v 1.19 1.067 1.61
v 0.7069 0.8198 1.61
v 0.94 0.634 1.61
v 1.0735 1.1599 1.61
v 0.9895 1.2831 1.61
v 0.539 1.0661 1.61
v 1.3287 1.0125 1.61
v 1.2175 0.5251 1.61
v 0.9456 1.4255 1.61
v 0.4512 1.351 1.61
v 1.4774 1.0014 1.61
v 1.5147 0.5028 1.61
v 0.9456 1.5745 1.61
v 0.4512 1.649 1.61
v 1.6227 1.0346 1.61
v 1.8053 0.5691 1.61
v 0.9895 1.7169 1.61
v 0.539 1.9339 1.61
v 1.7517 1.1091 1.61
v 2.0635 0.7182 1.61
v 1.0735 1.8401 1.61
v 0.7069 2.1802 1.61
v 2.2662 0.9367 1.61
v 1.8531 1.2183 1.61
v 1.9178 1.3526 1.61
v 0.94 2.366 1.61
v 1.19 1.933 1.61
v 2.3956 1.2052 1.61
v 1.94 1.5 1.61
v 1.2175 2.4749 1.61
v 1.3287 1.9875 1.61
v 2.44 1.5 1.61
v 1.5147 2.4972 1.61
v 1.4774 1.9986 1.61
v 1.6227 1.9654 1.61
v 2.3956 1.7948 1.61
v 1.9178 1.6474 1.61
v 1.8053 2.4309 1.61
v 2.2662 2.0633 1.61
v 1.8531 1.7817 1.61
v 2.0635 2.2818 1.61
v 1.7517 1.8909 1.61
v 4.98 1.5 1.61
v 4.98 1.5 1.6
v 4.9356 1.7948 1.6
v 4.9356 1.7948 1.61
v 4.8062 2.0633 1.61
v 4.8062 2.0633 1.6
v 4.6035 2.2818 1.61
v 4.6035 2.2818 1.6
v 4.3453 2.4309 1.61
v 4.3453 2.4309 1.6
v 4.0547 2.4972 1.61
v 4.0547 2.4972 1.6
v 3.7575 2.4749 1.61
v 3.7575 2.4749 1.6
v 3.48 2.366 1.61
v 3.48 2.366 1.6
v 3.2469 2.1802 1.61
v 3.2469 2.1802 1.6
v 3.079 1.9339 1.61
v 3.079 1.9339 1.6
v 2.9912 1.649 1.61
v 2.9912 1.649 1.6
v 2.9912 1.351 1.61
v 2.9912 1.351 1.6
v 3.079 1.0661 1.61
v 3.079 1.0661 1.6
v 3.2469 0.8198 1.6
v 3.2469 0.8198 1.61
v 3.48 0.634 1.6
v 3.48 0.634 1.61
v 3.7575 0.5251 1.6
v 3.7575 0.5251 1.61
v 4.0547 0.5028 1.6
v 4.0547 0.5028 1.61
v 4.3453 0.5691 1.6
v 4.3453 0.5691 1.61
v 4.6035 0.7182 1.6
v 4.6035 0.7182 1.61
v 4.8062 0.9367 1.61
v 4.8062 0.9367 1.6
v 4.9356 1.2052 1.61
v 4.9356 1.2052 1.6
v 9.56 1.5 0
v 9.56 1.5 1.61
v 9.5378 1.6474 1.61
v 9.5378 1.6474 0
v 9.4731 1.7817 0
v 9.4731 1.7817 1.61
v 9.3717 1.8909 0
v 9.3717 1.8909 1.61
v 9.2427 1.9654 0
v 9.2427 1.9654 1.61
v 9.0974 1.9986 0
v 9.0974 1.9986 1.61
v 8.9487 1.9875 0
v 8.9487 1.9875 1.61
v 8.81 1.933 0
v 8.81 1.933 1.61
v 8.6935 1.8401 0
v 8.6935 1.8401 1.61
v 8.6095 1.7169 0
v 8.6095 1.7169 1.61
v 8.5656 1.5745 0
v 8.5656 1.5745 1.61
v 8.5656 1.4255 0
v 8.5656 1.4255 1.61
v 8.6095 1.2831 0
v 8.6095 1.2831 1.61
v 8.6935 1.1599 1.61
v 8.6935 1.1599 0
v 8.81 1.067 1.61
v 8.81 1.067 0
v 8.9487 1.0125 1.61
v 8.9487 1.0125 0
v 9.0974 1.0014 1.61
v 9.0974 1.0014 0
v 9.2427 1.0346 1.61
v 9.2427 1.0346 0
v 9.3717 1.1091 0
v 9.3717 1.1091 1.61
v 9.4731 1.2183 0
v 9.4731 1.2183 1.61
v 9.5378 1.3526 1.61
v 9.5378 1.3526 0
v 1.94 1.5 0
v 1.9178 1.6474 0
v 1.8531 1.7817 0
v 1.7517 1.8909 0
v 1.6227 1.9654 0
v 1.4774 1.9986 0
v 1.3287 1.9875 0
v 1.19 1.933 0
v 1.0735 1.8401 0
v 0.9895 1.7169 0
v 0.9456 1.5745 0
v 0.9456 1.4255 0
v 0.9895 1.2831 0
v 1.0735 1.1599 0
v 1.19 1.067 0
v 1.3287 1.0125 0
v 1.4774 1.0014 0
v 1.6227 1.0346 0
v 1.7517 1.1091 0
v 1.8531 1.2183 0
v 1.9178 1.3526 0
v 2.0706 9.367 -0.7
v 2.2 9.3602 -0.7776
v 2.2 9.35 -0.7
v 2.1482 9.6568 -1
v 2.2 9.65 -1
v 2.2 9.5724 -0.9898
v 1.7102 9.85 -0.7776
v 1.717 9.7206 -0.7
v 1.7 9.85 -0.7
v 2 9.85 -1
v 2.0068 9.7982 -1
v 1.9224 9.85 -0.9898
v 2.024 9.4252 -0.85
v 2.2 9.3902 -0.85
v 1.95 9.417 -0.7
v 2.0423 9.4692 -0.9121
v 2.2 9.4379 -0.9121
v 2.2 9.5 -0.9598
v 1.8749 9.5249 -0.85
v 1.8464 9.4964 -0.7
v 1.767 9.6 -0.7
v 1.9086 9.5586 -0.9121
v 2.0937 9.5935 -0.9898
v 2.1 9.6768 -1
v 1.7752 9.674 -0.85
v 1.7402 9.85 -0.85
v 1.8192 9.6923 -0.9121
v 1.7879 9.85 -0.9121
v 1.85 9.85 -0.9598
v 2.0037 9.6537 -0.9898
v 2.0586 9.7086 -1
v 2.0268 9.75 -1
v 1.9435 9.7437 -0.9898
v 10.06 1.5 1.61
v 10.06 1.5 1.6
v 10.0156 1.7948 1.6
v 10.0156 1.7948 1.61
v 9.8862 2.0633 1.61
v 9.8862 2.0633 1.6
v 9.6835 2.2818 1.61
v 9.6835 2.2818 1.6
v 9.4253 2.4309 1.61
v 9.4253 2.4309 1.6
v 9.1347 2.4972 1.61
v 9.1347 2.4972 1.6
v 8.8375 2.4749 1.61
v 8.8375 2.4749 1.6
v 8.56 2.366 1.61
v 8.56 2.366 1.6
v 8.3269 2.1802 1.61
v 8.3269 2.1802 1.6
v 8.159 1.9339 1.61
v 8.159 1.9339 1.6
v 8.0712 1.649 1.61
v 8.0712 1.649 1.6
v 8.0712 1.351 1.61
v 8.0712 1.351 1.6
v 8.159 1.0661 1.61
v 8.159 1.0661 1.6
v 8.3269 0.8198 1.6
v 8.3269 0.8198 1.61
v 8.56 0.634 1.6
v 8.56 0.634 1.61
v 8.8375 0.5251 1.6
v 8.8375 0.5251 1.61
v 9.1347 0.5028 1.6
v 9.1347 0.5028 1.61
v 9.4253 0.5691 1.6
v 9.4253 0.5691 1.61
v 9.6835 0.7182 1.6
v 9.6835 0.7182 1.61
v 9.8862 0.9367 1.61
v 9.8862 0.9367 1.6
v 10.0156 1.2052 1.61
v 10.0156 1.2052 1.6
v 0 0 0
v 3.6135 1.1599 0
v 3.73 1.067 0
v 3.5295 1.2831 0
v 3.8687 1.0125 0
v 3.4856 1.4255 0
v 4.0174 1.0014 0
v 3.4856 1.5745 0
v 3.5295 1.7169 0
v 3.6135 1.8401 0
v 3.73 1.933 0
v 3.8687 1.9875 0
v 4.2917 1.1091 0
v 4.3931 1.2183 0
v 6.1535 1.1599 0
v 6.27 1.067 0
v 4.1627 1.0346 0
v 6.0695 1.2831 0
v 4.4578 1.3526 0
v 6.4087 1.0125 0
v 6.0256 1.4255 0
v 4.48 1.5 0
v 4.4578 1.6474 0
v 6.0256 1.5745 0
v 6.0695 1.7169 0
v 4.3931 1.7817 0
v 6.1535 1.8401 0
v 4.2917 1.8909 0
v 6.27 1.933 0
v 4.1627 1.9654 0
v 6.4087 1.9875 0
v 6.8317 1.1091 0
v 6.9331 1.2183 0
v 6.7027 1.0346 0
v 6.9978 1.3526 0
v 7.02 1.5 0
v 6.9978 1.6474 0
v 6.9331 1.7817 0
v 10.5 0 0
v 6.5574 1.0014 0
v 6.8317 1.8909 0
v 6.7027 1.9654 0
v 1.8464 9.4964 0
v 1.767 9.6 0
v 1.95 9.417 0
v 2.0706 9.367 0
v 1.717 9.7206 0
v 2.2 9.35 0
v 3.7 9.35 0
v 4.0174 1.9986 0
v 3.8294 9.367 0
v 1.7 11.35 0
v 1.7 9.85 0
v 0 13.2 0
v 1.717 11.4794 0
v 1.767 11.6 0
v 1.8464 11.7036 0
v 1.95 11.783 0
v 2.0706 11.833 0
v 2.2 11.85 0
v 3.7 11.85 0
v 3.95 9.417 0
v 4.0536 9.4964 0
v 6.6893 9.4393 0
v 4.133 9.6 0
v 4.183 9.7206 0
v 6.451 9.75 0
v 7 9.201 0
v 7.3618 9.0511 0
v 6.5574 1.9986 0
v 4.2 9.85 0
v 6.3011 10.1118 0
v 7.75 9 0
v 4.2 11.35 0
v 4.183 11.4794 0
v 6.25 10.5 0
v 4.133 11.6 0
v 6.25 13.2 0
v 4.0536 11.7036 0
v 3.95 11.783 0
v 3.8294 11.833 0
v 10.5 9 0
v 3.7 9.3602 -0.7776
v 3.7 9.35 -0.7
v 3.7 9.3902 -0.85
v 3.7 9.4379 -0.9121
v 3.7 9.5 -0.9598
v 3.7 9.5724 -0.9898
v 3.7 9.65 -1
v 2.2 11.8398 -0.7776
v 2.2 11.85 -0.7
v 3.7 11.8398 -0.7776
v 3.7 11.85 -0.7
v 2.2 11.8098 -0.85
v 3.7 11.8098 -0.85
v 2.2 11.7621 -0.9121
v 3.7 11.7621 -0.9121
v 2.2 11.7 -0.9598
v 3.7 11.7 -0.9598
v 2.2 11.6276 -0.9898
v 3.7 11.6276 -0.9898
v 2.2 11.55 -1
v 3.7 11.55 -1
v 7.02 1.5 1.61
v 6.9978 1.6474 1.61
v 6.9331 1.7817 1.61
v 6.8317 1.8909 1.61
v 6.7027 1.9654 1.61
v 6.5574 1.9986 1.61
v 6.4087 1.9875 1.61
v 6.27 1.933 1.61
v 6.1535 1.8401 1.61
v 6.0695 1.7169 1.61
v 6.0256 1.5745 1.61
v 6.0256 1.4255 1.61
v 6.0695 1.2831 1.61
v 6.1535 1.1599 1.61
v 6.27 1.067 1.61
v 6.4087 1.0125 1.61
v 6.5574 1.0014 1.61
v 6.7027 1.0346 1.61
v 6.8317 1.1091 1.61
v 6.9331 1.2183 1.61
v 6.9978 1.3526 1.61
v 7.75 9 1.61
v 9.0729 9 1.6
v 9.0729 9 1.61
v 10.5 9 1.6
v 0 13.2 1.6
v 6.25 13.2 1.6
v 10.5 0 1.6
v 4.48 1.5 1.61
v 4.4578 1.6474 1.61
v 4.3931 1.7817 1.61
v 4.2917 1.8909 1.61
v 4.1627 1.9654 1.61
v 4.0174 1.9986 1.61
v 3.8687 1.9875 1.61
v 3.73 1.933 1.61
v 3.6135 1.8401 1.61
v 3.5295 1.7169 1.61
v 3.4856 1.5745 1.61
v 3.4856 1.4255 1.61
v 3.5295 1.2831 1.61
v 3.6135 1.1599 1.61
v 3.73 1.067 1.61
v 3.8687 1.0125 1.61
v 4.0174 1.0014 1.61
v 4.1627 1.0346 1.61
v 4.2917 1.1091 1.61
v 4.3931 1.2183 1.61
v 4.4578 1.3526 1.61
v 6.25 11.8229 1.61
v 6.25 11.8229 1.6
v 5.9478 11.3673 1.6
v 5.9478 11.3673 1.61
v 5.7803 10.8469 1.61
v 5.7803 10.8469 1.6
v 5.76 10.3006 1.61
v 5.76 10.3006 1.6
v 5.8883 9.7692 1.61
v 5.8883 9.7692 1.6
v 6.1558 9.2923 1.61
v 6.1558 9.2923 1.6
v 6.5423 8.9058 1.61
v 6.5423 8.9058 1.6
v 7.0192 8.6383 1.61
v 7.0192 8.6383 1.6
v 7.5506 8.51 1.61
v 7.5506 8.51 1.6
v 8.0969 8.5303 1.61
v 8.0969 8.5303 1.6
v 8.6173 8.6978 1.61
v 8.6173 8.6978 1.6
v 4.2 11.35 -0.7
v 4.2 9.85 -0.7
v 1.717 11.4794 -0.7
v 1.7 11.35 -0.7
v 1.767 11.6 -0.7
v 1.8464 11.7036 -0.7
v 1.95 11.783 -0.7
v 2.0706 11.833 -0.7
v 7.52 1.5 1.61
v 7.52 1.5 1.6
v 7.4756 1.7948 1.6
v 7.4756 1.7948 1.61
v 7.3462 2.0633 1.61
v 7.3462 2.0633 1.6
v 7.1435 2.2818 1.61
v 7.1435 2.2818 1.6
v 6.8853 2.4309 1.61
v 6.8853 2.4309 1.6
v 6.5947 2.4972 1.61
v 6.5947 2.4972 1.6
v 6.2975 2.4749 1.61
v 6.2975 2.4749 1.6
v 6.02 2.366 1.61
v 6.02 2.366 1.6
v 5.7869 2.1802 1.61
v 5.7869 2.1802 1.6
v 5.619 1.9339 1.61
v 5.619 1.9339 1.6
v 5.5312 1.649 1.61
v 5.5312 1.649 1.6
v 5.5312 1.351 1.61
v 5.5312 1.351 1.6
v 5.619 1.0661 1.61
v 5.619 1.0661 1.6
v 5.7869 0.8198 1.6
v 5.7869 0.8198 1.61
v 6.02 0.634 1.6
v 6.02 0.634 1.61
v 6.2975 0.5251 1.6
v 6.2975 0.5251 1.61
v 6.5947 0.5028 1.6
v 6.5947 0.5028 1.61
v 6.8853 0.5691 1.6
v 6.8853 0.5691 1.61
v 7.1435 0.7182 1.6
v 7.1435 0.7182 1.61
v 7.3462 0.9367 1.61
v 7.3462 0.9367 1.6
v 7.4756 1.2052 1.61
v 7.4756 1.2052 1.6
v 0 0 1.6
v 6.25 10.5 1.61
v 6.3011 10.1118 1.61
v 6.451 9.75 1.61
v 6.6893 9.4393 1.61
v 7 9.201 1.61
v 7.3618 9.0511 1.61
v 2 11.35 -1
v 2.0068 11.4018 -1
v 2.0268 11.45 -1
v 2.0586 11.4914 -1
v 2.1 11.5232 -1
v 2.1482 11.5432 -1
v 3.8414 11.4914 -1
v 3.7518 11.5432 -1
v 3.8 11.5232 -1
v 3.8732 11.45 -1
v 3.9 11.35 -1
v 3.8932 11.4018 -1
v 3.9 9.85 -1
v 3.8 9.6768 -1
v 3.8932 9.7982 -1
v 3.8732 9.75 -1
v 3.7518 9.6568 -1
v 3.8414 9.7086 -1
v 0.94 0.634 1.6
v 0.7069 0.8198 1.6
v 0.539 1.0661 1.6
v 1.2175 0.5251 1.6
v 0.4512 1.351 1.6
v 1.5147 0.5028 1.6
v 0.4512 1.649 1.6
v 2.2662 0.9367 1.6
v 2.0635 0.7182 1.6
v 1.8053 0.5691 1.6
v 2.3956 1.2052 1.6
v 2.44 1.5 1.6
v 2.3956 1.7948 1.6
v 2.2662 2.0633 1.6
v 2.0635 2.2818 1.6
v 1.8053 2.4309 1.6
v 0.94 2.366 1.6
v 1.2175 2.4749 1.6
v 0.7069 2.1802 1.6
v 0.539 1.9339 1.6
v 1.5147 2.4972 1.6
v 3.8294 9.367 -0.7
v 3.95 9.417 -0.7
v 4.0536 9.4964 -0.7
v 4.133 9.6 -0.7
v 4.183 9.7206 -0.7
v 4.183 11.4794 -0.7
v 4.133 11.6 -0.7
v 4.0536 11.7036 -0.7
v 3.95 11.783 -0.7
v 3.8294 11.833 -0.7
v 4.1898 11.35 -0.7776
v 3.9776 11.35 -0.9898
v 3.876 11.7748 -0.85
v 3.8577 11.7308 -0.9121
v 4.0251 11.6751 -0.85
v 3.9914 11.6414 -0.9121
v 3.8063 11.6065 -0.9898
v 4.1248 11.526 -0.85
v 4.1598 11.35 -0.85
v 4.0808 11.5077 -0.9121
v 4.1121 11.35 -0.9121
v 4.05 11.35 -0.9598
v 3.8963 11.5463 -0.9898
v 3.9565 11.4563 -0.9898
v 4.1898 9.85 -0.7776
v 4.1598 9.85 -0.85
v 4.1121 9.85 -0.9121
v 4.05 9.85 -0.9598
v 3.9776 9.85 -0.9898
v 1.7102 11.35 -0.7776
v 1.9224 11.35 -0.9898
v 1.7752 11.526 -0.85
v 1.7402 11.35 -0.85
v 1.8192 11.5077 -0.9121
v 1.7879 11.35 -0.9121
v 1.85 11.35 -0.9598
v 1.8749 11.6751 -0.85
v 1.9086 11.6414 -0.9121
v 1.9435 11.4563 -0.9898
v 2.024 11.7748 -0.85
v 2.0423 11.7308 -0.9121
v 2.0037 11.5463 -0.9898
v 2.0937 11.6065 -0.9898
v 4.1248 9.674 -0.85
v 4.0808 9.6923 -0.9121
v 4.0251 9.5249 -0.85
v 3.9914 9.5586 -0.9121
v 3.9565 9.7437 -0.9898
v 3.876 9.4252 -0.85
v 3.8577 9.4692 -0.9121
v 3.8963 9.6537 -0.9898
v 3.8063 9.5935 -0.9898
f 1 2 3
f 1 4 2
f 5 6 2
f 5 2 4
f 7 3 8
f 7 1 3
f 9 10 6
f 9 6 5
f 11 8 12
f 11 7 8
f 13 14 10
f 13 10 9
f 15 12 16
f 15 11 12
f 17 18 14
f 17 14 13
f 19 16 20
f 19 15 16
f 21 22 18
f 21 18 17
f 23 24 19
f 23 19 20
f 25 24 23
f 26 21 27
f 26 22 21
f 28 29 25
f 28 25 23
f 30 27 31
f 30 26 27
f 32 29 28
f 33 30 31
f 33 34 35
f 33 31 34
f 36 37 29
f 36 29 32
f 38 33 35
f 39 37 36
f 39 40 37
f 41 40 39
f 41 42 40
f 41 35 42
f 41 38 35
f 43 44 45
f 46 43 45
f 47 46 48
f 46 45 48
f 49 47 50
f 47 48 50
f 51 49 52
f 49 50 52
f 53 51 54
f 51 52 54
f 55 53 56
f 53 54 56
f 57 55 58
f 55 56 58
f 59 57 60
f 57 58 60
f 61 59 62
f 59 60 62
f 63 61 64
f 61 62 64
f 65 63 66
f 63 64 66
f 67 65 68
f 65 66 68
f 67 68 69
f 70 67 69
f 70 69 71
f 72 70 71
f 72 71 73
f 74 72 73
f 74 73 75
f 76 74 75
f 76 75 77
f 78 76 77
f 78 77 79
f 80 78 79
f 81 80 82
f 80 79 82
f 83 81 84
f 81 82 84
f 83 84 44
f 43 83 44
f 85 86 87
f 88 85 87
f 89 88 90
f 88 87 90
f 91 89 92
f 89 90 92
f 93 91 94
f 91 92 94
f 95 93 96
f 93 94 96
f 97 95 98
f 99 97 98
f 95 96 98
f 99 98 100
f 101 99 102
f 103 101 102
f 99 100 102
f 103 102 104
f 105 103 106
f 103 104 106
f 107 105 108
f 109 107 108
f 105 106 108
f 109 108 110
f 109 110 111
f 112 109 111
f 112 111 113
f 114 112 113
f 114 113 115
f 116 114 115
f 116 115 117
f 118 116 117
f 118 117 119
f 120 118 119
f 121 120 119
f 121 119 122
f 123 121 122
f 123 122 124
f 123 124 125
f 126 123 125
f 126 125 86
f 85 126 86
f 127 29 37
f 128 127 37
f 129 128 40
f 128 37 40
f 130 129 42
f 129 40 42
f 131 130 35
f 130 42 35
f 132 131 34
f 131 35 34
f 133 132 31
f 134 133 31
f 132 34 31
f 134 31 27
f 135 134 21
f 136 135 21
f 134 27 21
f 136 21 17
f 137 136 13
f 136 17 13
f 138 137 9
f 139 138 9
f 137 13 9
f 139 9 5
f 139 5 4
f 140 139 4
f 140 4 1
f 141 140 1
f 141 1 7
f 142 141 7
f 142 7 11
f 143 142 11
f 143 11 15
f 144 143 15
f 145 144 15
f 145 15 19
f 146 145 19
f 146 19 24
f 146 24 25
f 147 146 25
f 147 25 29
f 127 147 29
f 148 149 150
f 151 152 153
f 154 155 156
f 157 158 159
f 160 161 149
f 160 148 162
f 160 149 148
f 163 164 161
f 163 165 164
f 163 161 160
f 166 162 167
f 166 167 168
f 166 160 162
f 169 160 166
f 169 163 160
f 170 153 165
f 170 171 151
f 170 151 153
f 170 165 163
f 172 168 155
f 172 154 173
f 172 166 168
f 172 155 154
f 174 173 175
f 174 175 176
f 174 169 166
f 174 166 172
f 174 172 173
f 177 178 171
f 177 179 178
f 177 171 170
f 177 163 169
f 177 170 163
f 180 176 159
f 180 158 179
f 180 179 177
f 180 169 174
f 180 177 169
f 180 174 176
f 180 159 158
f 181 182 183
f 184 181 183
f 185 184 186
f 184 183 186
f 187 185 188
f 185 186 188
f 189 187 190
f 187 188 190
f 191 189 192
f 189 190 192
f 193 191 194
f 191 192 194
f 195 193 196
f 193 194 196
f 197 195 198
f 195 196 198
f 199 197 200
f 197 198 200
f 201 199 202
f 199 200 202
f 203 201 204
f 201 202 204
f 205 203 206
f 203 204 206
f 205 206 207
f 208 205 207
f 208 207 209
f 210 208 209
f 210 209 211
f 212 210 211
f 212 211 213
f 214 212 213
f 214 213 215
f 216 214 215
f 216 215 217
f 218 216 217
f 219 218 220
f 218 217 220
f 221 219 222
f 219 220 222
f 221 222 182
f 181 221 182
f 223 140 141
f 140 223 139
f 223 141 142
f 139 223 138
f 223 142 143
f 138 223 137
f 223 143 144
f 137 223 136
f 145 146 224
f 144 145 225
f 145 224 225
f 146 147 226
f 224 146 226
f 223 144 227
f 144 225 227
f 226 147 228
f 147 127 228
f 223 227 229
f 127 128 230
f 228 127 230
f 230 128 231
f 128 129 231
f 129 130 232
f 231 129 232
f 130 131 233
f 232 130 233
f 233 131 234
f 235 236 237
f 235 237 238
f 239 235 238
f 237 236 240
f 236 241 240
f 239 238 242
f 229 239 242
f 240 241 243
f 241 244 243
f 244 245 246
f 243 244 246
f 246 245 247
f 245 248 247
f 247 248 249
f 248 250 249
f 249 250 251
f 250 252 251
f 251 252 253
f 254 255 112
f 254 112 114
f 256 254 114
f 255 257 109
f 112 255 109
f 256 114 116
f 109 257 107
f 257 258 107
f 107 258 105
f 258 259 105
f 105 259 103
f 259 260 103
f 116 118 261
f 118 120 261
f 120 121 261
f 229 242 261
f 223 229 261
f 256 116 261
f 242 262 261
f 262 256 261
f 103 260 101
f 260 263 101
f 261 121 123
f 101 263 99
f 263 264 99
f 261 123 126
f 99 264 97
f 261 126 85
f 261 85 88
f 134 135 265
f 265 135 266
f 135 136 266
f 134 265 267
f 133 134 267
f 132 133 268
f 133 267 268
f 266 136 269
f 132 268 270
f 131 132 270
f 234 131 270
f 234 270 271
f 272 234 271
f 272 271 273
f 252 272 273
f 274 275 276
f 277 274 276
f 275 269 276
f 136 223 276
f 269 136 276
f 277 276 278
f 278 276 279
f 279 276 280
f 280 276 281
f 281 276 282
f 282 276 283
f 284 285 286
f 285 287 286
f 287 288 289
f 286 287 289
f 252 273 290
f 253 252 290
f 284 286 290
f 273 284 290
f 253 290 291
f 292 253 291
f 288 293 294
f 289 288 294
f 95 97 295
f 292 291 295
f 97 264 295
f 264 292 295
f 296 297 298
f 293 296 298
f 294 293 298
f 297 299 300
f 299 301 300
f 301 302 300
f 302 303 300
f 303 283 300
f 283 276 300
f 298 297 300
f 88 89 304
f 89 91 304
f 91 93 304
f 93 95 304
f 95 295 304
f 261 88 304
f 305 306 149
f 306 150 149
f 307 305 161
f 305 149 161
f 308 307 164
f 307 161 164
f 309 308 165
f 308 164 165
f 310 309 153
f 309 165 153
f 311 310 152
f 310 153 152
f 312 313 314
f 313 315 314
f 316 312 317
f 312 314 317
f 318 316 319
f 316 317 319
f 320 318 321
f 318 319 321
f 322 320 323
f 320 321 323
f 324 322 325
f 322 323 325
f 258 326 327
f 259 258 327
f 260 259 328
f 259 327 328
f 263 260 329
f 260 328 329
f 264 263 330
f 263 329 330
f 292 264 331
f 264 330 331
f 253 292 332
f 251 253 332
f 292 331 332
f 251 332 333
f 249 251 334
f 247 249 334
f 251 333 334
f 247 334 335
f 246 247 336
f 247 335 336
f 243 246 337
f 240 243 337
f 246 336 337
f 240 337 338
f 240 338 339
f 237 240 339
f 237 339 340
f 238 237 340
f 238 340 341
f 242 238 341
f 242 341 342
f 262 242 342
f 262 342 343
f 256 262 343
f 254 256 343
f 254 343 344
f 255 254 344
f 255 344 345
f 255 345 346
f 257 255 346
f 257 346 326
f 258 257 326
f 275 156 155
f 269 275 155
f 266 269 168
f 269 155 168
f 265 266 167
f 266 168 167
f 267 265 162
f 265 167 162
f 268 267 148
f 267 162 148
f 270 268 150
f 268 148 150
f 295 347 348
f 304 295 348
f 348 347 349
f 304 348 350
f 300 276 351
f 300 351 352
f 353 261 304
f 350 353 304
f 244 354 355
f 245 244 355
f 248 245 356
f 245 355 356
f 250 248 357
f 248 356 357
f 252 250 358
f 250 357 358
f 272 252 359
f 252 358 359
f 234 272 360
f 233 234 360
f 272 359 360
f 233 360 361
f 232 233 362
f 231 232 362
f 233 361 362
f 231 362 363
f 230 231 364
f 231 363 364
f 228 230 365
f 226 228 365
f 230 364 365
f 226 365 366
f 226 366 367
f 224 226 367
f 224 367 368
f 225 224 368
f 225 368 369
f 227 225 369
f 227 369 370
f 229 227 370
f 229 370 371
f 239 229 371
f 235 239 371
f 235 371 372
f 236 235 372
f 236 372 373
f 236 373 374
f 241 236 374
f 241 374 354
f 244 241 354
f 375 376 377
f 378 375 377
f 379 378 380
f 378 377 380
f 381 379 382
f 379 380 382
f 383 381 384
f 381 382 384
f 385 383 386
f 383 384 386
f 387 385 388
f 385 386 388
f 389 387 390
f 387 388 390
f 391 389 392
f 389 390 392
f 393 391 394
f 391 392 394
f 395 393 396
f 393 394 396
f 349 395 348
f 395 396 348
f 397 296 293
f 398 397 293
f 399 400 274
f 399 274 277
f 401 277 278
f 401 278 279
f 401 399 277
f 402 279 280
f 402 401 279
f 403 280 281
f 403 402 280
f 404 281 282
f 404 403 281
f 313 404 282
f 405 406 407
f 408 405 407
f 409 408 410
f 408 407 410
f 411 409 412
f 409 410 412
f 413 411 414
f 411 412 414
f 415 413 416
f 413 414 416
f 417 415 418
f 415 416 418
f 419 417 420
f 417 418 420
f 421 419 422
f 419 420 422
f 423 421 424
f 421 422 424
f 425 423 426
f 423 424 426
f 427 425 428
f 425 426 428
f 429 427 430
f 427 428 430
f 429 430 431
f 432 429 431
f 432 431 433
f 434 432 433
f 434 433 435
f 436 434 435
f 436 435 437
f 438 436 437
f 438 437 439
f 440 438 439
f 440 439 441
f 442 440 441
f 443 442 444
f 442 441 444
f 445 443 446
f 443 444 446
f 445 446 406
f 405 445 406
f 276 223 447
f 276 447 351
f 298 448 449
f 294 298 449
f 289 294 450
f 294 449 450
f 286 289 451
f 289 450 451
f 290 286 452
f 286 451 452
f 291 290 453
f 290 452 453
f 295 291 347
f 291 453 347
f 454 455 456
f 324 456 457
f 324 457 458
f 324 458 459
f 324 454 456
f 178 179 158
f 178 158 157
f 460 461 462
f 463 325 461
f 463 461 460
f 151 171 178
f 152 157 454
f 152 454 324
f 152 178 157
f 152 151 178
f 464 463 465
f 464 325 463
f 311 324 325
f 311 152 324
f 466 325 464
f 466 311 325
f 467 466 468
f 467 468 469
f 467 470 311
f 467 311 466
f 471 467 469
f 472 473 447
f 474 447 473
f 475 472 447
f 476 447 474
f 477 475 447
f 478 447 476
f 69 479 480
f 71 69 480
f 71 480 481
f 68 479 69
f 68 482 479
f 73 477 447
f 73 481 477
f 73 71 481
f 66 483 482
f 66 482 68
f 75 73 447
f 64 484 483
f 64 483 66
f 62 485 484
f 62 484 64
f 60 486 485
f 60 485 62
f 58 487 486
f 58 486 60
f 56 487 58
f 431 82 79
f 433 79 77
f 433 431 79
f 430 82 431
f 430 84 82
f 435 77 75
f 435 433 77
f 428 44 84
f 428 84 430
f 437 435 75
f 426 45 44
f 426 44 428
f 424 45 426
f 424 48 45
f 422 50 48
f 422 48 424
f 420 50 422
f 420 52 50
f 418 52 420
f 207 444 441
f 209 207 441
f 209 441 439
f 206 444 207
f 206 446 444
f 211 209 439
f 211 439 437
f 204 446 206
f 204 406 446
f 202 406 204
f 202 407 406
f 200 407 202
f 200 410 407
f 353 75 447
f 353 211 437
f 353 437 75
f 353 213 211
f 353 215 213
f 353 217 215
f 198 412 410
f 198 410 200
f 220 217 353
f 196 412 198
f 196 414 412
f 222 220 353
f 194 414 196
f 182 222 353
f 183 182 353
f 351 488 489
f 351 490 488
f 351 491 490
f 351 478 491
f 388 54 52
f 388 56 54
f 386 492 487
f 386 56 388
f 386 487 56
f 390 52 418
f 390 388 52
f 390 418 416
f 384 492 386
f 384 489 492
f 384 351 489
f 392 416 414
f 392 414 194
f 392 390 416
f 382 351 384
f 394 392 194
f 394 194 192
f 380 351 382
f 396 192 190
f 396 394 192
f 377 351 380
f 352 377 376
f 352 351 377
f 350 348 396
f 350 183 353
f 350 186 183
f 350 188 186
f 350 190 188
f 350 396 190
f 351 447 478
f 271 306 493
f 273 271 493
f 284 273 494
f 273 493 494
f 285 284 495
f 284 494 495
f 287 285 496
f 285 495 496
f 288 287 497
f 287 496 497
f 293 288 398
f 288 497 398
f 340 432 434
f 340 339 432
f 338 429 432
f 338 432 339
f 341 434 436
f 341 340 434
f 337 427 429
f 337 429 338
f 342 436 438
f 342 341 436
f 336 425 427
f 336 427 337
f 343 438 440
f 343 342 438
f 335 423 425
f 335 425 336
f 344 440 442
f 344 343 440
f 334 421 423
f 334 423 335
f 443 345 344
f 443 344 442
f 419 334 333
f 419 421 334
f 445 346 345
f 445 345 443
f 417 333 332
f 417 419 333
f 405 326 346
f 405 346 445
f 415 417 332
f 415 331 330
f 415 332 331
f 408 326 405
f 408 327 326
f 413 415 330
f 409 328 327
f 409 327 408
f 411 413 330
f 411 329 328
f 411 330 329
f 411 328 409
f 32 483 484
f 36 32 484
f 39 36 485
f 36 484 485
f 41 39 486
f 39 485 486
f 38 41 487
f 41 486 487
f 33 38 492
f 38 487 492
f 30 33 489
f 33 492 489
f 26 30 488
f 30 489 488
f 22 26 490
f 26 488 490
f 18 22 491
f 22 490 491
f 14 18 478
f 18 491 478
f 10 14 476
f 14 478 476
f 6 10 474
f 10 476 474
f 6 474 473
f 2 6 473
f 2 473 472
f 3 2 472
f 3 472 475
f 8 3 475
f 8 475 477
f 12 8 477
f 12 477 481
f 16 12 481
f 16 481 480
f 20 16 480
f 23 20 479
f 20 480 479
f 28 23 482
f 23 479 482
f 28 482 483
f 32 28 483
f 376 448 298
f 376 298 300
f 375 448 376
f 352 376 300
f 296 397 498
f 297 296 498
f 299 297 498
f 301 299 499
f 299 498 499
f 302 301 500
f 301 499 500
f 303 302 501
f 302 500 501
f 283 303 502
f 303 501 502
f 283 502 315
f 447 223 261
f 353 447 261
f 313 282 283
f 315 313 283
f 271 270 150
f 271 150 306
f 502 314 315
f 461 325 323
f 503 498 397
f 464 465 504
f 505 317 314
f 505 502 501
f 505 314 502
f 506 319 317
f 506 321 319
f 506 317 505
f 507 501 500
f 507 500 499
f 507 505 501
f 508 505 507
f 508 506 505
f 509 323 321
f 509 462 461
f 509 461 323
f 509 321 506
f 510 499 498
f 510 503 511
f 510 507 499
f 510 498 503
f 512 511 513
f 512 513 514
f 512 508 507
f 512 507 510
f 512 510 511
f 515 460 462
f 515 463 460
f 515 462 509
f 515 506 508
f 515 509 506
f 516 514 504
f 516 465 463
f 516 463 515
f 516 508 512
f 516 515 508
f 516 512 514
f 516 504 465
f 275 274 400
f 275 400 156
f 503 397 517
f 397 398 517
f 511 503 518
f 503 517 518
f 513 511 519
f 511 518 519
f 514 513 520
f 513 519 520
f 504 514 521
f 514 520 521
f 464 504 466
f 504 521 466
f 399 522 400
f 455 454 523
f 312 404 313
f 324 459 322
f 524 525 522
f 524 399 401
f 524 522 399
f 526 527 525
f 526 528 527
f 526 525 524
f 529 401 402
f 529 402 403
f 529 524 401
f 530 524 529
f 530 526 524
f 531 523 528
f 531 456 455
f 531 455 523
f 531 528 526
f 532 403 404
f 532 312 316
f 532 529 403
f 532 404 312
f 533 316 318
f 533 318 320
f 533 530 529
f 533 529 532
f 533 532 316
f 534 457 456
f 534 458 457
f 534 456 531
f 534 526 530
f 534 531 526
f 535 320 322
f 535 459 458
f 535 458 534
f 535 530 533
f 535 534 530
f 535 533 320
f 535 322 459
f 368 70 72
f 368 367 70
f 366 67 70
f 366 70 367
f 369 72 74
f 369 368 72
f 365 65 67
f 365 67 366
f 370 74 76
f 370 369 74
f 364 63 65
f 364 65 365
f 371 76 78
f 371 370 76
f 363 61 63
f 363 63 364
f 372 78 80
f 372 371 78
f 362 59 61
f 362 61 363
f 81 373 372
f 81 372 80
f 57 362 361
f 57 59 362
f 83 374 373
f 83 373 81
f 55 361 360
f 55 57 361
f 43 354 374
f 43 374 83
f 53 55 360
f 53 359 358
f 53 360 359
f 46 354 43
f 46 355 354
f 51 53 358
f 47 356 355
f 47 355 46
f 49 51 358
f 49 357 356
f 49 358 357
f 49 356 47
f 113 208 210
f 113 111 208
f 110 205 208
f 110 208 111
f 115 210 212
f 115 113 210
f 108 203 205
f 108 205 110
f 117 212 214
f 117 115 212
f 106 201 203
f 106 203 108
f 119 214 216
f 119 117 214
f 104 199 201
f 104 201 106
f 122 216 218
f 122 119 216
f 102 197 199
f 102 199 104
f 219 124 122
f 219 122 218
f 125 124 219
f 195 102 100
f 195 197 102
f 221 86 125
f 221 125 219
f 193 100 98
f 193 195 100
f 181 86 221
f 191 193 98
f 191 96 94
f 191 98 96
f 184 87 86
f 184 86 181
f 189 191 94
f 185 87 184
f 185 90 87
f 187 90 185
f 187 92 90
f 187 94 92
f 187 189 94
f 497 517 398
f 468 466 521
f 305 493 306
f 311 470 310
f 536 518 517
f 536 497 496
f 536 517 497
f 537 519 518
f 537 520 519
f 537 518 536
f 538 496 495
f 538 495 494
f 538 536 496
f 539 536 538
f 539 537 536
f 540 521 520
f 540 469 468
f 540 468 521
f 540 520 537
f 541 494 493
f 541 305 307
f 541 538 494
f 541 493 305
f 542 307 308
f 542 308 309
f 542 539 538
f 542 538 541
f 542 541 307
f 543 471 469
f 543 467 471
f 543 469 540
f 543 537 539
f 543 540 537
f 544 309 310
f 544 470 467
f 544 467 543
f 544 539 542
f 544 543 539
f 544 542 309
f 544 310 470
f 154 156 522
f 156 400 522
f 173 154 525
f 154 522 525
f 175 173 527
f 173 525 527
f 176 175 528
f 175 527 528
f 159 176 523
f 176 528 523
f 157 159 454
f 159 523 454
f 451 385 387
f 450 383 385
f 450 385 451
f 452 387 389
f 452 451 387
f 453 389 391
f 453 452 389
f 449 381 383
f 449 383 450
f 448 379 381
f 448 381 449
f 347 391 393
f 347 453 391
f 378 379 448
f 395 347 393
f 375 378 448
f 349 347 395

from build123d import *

# Parameters (mm, degrees)
BOX_W        = 10.5
BOX_H        = 13.2
BOX_DEPTH    = 1.6
SKETCH_R     = 1
SKETCH_R_2   = 2
PAD_DEPTH    = 0.01
SKETCH001_R  = 0.5
POCKET_DEPTH = 1.611
SKETCH002_W  = 2.5
SKETCH002_H  = 2.5
PAD001_DEPTH = 1
FILLET_R     = 0.5
FILLET001_R  = 0.3


with BuildPart() as part:
    # Box → Box (new body)
    with BuildSketch(Plane.XY):
        with Locations((5.25, 6.6)):
            Rectangle(BOX_W, BOX_H)
    extrude(amount=BOX_DEPTH)

    # Sketch → Pad (new body)
    with BuildSketch(Plane.XY.offset(1.6)):
        with Locations((1.44, 1.5)):
            Circle(SKETCH_R)
        with Locations((3.98, 1.5)):
            Circle(SKETCH_R)
        with Locations((6.52, 1.5)):
            Circle(SKETCH_R)
        with Locations((9.06, 1.5)):
            Circle(SKETCH_R)
        with Locations((7.75, 10.5)):
            Circle(SKETCH_R_2)
    extrude(amount=PAD_DEPTH)

    # Sketch001 → Pocket (cut, through all)
    with BuildSketch(Plane.XY.offset(1.61)):
        with Locations((1.44, 1.5)):
            Circle(SKETCH001_R)
        with Locations((3.98, 1.5)):
            Circle(SKETCH001_R)
        with Locations((6.52, 1.5)):
            Circle(SKETCH001_R)
        with Locations((9.06, 1.5)):
            Circle(SKETCH001_R)
        with BuildLine():
            ThreePointArc((6.25, 10.5), (6.68934, 9.43934), (7.75, 9))
            Line((7.75, 9), (10.5, 9))
            Line((10.5, 9), (10.5, 13.2))
            Line((6.25, 13.2), (10.5, 13.2))
            Line((6.25, 10.5), (6.25, 13.2))
        make_face()
    extrude(amount=-POCKET_DEPTH, mode=Mode.SUBTRACT)

    # Sketch002 → Pad001 (new body)
    with BuildSketch(Plane(origin=(0, 0, 0), x_dir=(1, 0, 0), z_dir=(0, 0, -1))):
        with Locations((2.95, -10.6)):
            Rectangle(SKETCH002_W, SKETCH002_H)
    extrude(amount=PAD001_DEPTH)

    # Fillet
    fillet_edges = [part.edges().sort_by_distance(p)[0] for p in [
        (1.7, 11.85, -0.5),
        (4.2, 11.85, -0.5),
        (4.2, 9.35, -0.5),
        (1.7, 9.35, -0.5),
    ]]
    fillet(fillet_edges, radius=FILLET_R)

    # Fillet001
    fillet001_edges = [part.edges().sort_by_distance(p)[0] for p in [
        (4.2, 10.6, -1),
        (2.95, 9.35, -1),
        (1.7, 10.6, -1),
        (2.95, 11.85, -1),
    ]]
    fillet(fillet001_edges, radius=FILLET001_R)


solid = part.part
